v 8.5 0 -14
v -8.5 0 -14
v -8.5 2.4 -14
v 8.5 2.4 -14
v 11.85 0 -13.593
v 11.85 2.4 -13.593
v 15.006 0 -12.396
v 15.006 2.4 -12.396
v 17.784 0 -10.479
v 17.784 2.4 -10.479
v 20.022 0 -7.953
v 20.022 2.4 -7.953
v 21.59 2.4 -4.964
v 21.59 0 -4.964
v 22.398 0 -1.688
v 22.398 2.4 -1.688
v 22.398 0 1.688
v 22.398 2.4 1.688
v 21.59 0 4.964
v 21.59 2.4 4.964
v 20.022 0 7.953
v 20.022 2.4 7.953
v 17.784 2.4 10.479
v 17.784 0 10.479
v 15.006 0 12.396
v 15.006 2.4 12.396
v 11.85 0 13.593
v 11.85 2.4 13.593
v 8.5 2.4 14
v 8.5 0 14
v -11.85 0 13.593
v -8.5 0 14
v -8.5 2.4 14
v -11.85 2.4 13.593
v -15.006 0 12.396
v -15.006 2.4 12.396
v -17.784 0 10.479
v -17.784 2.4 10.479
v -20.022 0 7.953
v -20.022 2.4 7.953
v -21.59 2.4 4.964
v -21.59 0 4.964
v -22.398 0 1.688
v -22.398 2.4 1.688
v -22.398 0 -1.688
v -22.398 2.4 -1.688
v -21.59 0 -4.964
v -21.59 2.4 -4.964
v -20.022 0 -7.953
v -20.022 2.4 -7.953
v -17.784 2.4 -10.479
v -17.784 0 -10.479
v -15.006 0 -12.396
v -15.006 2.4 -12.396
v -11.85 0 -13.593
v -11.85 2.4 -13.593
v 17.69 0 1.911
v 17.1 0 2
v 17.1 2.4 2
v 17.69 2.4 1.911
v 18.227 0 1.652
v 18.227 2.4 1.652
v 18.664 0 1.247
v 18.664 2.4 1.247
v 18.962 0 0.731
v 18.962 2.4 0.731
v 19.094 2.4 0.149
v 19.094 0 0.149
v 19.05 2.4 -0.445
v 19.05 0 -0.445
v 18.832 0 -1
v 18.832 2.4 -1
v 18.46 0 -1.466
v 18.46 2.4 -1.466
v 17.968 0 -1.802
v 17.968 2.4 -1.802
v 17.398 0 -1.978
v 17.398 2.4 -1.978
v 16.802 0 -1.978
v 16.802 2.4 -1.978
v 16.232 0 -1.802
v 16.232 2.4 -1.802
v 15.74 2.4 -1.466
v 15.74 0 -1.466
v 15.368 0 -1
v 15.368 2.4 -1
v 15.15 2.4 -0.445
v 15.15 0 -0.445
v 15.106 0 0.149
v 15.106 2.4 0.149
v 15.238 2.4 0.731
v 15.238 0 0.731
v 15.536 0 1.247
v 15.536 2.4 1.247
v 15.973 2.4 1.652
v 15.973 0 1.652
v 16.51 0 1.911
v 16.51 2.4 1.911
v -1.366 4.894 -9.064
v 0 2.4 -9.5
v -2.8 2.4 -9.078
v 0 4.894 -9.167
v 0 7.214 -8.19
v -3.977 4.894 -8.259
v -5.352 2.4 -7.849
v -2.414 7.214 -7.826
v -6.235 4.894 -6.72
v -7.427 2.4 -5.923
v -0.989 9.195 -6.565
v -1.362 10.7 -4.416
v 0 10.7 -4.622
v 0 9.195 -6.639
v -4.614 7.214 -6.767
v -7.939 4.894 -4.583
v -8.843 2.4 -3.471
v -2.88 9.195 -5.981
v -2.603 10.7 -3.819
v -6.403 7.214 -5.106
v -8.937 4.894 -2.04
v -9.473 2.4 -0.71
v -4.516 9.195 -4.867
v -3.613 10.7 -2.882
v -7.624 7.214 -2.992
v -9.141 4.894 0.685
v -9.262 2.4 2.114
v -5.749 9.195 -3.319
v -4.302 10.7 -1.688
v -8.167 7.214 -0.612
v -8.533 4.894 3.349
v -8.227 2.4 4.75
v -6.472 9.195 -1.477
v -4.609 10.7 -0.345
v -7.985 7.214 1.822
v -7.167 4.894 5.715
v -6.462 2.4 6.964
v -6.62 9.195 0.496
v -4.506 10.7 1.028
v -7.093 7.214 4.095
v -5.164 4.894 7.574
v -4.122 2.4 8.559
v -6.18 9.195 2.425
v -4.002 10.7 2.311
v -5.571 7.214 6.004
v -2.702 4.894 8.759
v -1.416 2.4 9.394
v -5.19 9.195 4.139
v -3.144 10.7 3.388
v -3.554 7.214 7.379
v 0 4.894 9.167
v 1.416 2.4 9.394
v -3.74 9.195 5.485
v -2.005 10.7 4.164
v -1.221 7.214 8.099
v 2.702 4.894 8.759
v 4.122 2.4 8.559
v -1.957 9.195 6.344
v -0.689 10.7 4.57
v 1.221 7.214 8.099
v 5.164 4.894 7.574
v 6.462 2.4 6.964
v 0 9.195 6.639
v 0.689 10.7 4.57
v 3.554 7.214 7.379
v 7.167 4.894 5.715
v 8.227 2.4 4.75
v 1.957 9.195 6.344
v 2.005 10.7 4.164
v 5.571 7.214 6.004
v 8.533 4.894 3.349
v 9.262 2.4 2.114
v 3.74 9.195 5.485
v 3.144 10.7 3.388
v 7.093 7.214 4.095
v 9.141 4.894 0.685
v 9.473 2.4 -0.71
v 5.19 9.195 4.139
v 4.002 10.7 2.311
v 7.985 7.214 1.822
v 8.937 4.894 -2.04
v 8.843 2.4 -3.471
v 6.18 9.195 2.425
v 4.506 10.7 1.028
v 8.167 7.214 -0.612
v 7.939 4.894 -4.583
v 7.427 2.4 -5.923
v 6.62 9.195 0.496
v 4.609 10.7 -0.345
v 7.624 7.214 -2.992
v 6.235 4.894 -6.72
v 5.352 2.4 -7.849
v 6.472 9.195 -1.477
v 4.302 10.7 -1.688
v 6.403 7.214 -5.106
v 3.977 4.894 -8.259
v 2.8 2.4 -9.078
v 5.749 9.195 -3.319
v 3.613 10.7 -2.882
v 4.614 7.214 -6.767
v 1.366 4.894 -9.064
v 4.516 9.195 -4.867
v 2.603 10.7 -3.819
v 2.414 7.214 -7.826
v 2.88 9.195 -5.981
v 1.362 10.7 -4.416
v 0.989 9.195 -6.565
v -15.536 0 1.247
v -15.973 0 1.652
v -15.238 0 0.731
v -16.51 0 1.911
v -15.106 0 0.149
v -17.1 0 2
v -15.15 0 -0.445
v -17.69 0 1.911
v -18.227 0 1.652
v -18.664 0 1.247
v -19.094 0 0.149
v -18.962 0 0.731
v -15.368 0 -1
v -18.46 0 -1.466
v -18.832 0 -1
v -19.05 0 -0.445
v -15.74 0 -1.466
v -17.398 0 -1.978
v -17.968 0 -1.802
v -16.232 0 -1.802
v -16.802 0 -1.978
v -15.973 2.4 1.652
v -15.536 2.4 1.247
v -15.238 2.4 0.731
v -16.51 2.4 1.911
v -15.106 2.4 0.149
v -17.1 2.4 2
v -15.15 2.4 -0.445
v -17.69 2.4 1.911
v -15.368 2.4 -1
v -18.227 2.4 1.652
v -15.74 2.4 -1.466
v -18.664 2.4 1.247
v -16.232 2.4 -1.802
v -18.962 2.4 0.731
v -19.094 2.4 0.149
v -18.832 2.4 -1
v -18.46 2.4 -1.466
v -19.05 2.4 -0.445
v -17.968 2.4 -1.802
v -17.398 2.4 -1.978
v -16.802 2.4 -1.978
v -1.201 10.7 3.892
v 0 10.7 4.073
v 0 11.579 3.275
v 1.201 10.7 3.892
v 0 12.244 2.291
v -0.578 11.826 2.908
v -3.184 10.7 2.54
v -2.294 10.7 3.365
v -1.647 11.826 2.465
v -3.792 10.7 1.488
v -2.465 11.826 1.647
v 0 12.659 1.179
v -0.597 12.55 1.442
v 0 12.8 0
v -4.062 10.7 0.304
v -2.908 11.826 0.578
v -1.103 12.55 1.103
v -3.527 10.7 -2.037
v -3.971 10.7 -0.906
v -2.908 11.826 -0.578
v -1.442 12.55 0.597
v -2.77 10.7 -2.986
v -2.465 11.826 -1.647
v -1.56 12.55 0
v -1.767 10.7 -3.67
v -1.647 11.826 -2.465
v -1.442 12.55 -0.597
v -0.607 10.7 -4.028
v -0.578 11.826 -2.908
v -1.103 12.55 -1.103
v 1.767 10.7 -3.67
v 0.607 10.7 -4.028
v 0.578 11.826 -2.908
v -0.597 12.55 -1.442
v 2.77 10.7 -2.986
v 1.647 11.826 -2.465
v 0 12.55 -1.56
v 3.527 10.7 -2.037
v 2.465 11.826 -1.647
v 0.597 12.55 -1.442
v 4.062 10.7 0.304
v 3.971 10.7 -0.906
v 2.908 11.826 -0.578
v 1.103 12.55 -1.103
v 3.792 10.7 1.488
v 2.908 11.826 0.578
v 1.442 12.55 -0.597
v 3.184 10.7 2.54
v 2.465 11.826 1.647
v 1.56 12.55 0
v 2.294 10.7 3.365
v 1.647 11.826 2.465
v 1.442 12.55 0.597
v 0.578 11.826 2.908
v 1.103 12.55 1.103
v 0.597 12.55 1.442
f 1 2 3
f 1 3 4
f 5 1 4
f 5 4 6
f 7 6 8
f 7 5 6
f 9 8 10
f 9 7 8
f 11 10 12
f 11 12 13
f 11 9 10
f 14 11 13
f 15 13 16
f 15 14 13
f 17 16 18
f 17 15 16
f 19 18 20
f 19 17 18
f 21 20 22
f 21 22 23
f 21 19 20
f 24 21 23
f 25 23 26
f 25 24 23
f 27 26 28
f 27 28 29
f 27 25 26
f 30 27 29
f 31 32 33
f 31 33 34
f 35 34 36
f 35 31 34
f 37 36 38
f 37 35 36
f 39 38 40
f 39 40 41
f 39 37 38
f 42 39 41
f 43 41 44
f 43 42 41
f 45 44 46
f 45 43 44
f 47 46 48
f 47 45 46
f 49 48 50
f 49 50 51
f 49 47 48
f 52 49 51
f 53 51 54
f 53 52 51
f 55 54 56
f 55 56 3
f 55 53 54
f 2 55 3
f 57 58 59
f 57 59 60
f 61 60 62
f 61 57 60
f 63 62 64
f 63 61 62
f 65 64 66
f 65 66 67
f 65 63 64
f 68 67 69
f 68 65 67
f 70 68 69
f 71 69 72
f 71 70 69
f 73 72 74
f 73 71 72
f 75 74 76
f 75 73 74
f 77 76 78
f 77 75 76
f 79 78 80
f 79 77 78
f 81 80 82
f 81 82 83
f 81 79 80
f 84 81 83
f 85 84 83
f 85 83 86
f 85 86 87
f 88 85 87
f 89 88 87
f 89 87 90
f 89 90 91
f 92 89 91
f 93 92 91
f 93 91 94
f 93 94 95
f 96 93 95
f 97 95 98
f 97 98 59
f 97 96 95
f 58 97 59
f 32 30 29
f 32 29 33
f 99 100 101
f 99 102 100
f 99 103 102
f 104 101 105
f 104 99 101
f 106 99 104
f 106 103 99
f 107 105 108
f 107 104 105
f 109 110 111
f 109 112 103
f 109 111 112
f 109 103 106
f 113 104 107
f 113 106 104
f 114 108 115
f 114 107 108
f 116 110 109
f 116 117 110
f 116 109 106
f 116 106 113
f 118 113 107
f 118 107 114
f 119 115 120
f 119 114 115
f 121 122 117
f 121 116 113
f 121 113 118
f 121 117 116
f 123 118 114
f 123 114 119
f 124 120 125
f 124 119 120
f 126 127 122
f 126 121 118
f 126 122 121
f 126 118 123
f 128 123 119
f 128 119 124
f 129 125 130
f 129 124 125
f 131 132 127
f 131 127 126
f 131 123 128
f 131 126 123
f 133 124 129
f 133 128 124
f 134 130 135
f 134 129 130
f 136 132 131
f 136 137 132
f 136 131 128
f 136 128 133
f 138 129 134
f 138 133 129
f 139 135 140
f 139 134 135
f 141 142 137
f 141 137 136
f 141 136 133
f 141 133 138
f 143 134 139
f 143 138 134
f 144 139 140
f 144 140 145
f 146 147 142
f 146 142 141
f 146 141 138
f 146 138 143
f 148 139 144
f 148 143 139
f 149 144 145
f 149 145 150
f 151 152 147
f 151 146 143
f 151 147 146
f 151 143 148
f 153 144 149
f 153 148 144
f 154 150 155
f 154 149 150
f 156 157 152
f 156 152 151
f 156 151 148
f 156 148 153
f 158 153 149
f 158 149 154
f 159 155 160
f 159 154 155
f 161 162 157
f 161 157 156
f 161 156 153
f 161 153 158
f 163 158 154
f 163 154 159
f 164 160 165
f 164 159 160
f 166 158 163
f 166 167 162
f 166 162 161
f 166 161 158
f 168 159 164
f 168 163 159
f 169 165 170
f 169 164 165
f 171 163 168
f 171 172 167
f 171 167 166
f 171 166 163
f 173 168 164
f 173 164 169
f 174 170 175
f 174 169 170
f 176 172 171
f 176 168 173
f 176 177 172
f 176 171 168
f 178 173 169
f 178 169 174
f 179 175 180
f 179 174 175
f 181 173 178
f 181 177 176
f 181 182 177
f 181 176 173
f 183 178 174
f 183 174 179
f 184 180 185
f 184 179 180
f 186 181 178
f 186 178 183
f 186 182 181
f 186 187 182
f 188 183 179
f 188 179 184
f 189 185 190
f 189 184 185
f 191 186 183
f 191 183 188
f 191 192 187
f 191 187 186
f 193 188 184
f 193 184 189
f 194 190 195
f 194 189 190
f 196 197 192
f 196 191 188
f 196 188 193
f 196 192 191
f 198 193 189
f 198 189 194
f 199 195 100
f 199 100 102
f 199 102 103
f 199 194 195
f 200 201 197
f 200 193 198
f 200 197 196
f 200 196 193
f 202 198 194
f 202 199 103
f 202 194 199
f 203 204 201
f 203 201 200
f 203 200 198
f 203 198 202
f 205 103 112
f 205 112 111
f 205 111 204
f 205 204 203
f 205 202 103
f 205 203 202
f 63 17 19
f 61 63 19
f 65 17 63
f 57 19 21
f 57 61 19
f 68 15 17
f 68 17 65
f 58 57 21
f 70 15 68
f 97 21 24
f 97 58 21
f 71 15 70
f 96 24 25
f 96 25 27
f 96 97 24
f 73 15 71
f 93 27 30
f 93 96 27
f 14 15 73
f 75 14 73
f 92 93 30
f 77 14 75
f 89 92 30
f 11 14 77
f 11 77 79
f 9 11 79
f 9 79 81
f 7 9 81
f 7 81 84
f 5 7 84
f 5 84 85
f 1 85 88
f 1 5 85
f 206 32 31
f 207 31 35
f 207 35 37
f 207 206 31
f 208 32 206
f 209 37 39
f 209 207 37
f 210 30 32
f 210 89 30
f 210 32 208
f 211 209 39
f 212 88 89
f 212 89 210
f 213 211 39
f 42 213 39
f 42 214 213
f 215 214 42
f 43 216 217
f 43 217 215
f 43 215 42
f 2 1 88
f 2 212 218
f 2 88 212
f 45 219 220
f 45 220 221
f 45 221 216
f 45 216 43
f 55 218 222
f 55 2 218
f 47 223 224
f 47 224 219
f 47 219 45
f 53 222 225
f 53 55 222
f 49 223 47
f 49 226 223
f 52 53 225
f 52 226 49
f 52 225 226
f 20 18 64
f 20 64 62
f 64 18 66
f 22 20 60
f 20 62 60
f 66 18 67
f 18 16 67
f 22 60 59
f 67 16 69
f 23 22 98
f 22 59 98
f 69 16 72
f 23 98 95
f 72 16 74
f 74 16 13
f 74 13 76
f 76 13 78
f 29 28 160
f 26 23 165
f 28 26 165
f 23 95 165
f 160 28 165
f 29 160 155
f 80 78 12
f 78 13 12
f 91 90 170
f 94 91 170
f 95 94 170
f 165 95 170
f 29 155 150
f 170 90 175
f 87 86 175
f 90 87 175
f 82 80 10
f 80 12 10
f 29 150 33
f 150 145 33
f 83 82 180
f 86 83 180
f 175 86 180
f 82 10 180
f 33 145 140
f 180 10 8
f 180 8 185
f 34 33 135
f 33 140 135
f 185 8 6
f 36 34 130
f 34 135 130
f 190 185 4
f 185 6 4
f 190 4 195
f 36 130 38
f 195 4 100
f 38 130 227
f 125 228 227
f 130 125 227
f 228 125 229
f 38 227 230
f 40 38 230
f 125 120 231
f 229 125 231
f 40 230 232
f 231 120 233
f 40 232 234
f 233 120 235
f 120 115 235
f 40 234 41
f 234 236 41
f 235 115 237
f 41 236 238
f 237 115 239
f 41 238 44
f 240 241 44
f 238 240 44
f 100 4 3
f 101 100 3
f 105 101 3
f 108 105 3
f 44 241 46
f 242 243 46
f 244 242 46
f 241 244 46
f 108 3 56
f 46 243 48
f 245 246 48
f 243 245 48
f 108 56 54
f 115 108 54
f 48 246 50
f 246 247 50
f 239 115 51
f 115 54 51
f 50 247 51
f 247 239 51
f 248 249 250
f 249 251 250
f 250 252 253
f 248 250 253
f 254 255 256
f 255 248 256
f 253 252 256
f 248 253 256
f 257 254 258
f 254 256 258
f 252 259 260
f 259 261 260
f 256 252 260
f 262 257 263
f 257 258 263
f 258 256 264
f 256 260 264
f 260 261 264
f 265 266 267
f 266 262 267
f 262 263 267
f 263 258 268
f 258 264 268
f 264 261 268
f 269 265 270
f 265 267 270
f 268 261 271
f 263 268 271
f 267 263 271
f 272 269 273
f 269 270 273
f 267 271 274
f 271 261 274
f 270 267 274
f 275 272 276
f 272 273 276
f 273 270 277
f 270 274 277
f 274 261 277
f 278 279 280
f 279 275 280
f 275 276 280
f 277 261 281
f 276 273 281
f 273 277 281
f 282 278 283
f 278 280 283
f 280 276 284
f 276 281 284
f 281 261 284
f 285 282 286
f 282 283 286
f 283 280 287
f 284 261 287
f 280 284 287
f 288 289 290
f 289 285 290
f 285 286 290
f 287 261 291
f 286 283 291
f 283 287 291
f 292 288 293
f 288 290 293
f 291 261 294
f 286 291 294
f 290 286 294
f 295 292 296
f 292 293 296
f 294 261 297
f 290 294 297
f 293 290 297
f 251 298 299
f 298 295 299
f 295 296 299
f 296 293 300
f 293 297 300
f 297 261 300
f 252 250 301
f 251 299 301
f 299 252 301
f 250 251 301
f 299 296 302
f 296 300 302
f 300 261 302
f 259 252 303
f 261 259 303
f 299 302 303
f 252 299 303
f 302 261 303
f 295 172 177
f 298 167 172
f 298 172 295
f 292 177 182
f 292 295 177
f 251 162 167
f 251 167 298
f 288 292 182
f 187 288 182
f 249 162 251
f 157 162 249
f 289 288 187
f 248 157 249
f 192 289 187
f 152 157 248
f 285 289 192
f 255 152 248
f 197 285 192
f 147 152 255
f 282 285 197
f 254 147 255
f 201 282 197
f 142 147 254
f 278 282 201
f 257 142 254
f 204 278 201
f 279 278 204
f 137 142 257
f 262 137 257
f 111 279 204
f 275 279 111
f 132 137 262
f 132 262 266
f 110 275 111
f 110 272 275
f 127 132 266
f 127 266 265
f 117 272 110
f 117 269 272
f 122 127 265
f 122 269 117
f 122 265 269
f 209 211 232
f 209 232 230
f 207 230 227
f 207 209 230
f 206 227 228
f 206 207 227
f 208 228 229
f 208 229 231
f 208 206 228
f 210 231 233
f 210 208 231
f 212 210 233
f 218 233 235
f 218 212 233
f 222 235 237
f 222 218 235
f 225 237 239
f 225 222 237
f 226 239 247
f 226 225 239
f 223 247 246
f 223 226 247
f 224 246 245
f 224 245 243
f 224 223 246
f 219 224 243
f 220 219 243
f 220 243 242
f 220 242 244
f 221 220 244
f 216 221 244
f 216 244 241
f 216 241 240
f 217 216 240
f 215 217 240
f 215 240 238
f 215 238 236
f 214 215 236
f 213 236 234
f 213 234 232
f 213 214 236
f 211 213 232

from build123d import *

# Parameters (mm, degrees)
SKETCH1_R           = 2
BOSS_EXTRUDE1_DEPTH = 2.4


with BuildPart() as part:
    # Sketch1 → Boss-Extrude1 (new body)
    with BuildSketch(Plane(origin=(0, 0, 0), x_dir=(1, 0, 0), z_dir=(0, 1, 0))):
        with BuildLine():
            Line((-8.5, 14), (8.5, 14))
            ThreePointArc((8.5, 14), (22.5, 0), (8.5, -14))
            Line((8.5, -14), (-8.5, -14))
            ThreePointArc((-8.5, -14), (-22.5, 0), (-8.5, 14))
        make_face()
        with Locations(Location((17.1, 0, 0), (0, 0, 270))):
            Circle(SKETCH1_R, mode=Mode.SUBTRACT)
        with Locations(Location((-17.1, 0, 0), (0, 0, 270))):
            Circle(SKETCH1_R, mode=Mode.SUBTRACT)
    extrude(amount=BOSS_EXTRUDE1_DEPTH)

    # Sketch2 → Revolve1 (revolve)
    with BuildSketch(Plane(origin=(0, 0, 0), x_dir=(0, 0, -1), z_dir=(1, 0, 0)), mode=Mode.PRIVATE) as revolve1_sk:
        with BuildLine():
            Line((-4.621688003, 10.7), (0, 10.7))
            Line((0, 10.7), (0, 2.4))
            Line((0, 2.4), (-9.5, 2.4))
            ThreePointArc((-9.5, 2.4), (-8.190117094, 7.213728491), (-4.621688003, 10.7))
        make_face()
    revolve(revolve1_sk.sketch.rotate(Axis((0, 2.4, 0), (0, 1, 0)), 180), axis=Axis((0, 2.4, 0), (0, 1, 0)))

    # Sketch3 → Revolve2 (revolve)
    with BuildSketch(Plane(origin=(0, 0, 0), x_dir=(0, 0, -1), z_dir=(1, 0, 0))):
        with BuildLine():
            Line((0, 12.8), (0, 2.8))
            ThreePointArc((0, 2.8), (-5, 7.8), (0, 12.8))
        make_face()
    revolve(axis=Axis((0, 12.8, 0), (0, -1, 0)))


solid = part.part
